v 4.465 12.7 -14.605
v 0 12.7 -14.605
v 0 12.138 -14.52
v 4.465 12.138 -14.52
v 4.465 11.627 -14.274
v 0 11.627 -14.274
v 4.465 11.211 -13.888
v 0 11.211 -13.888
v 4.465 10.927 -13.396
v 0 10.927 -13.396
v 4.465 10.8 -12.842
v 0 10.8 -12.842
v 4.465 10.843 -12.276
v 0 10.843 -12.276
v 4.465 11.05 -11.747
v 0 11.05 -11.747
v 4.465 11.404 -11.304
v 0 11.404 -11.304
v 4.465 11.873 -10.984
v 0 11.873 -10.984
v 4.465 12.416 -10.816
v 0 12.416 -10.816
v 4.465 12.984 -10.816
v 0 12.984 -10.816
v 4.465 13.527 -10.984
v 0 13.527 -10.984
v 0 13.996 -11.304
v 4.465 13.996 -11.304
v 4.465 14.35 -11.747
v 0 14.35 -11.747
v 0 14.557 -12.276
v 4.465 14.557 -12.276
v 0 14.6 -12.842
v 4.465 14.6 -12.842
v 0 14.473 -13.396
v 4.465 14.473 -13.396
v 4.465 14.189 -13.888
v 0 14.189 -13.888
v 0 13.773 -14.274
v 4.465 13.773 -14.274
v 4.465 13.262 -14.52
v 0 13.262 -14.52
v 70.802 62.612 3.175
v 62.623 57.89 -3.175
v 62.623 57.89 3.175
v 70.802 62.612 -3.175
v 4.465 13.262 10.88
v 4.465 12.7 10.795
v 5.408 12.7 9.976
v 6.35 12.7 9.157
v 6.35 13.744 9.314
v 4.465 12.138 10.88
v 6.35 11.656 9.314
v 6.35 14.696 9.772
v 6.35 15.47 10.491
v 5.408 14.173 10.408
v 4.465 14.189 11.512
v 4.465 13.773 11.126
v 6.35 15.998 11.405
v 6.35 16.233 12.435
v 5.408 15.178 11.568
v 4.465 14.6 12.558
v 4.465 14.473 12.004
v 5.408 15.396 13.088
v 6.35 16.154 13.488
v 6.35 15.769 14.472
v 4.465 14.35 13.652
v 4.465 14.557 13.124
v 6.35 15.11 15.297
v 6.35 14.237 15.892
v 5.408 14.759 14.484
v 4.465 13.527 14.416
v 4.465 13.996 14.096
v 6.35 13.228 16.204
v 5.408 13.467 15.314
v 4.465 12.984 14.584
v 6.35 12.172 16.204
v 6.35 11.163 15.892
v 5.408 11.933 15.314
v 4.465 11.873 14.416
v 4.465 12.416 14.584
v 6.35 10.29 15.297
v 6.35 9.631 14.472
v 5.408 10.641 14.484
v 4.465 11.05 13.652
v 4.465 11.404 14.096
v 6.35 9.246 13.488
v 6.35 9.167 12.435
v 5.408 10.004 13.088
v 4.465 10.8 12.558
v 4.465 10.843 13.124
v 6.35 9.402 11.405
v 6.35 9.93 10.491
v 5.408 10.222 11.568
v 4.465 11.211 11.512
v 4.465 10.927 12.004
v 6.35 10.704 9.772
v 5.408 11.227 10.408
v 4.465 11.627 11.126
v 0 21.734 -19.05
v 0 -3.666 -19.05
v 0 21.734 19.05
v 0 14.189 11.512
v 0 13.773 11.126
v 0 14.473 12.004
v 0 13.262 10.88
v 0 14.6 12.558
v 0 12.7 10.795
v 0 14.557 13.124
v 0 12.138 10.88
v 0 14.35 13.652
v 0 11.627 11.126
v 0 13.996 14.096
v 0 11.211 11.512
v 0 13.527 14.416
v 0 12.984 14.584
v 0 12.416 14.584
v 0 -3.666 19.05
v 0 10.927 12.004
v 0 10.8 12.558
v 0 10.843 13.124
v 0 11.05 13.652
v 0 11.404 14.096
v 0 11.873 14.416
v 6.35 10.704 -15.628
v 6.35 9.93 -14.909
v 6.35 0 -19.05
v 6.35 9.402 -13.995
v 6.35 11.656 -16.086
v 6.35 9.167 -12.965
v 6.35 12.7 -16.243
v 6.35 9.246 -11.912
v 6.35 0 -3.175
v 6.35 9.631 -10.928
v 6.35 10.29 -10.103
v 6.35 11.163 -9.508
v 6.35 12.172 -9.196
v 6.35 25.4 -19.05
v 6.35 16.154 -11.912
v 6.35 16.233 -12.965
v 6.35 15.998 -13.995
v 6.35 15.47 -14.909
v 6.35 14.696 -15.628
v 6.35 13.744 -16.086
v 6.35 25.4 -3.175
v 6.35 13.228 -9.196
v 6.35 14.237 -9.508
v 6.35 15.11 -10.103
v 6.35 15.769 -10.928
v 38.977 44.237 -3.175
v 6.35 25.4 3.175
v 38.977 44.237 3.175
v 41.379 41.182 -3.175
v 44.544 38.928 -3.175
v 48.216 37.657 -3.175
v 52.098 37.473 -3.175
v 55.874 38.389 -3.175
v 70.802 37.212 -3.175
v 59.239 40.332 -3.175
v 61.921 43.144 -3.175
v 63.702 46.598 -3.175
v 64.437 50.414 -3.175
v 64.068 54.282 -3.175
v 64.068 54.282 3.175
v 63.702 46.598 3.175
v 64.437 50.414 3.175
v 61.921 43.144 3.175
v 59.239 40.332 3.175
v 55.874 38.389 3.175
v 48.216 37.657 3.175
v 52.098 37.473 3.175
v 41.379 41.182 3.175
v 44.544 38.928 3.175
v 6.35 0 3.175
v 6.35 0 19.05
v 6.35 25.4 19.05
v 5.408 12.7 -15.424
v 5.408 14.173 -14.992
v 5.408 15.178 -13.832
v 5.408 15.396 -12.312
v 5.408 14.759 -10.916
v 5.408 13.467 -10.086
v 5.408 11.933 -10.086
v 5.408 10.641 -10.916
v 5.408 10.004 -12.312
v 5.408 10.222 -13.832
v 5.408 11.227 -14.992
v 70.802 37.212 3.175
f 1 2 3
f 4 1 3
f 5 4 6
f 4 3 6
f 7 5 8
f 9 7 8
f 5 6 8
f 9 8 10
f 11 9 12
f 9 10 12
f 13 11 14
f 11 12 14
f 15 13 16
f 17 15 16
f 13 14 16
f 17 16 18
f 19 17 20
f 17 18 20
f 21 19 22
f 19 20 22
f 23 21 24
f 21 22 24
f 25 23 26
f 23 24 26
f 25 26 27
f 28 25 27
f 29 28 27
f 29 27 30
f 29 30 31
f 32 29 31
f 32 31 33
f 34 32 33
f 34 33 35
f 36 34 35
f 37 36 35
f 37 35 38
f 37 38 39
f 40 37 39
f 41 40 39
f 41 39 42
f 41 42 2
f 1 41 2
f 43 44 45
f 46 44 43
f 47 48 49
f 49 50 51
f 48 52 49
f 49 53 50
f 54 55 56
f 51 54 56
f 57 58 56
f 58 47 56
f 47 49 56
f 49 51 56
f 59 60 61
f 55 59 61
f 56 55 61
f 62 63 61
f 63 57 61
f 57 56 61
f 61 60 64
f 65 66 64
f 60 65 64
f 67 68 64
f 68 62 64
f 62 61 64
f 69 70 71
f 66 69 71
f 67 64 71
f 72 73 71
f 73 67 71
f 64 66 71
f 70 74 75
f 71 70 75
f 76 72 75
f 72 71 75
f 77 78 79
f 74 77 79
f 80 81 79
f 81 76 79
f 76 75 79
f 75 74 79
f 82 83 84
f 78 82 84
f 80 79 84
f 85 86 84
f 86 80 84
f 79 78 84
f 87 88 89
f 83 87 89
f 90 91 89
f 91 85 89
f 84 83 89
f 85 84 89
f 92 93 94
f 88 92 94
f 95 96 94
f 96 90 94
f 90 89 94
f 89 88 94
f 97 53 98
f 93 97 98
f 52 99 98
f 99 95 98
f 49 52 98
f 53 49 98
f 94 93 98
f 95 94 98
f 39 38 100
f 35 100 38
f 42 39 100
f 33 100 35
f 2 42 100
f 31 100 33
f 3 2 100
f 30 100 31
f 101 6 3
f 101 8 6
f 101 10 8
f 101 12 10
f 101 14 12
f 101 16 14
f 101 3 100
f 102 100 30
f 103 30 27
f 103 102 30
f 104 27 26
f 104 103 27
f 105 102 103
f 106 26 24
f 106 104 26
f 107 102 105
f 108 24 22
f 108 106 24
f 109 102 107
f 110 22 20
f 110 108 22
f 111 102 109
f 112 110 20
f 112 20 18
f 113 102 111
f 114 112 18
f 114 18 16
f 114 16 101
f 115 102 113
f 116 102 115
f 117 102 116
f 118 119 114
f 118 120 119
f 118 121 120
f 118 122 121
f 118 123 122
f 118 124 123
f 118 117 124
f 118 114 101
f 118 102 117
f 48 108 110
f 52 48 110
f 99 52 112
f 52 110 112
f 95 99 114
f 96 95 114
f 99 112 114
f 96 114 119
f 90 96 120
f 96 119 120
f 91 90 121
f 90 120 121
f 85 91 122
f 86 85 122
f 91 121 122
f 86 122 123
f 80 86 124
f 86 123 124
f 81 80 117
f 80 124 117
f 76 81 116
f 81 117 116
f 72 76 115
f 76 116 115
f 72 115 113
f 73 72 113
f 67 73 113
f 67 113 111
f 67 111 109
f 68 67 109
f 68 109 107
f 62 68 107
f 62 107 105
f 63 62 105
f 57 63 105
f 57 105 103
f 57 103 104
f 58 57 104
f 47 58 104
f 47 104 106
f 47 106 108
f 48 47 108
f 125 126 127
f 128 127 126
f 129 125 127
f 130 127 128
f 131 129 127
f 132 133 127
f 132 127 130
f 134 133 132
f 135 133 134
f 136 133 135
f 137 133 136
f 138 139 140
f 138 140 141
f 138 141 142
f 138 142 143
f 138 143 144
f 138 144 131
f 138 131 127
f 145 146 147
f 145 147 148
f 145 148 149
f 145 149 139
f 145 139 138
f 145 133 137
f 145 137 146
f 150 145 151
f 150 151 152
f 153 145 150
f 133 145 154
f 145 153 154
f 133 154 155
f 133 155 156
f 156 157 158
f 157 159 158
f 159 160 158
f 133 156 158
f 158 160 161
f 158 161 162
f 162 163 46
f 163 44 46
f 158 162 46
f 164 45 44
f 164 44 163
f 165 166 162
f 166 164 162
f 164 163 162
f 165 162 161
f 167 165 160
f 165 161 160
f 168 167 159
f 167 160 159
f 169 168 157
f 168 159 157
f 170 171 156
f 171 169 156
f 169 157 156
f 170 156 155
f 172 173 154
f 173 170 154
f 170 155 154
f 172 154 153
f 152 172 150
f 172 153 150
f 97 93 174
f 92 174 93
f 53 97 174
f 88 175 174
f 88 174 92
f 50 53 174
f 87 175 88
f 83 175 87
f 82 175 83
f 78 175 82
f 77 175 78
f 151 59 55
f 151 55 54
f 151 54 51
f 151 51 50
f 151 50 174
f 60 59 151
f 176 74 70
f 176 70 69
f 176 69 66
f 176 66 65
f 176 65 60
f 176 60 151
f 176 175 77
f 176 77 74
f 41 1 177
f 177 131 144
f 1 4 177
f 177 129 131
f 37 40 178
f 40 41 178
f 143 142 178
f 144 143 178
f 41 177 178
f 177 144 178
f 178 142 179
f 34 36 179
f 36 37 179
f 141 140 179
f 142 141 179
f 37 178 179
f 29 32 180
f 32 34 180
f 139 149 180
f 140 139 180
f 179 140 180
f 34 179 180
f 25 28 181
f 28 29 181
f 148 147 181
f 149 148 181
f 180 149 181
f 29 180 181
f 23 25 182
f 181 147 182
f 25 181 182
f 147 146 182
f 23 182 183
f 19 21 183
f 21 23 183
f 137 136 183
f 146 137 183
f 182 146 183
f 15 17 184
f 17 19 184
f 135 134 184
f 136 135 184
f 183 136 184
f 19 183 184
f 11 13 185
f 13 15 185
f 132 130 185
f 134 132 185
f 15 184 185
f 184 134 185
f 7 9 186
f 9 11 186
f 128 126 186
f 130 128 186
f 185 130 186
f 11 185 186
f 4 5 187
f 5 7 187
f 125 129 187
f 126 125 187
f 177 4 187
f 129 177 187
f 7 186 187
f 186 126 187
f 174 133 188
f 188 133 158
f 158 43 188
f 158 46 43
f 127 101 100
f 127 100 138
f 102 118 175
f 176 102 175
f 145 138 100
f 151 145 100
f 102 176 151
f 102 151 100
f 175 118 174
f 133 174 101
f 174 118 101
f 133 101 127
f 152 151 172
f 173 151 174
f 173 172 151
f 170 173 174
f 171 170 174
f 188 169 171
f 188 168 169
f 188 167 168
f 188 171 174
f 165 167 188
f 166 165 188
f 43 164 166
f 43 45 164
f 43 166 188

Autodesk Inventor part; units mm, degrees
ref_plane "YZ Plane" through (0, 0, 0) normal (1, 0, 0) x (0, 1, 0)
ref_plane "XZ Plane" through (0, 0, 0) normal (0, 1, 0) x (-1, 0, 0)
ref_plane "XY Plane" through (0, 0, 0) normal (0, 0, 1) x (1, 0, 0)
sketch "Sketch5" plane through (0, 0, 0) normal (0, 0, 1) x (1, 0, 0)
  line L0 (0, 0) -> (6.35, 0)
  line L1 (6.35, 0) -> (6.35, 25.4)
  line L2 (6.35, 25.4) -> (0, 25.4)
  line L3 (0, 25.4) -> (0, 0)
  dimension "d21" = 25.4
  dimension "d22" = 6.35
extrude "Extrusion3" add sketch "Sketch5" against normal mid plane 38.1
sketch "Sketch6" plane through (0, 0, 0) normal (0, 0, 1) x (1, 0, 0)
  line L0 (6.35, 25.4) -> (6.35, 0) projected
  line L1 (0, 25.4) -> (6.35, 25.4) projected
  line L2 (6.35, 0) -> (0, 0) projected
  line L3 (0, 0) -> (0, 25.4) projected
  line L4 (6.35, 0) -> (70.8025, 37.2117)
  line L5 (6.35, 0) -> (80.7733, 0) construction
  line L6 (70.8025, 62.6117) -> (70.8025, 37.2117)
  arc A0 (38.9766, 44.237) -> (62.6234, 57.8895) centre (50.8, 51.0632) ccw
  line L7 (6.35, 25.4) -> (38.9766, 44.237)
  line L8 (62.6234, 57.8895) -> (70.8025, 62.6117)
  dimension "d25" = 30
  dimension "d26" = 27.305
  dimension "d29" = 6.35
  dimension "d30" = 50.8
  dimension "d33" = 0
extrude "Extrusion4" add sketch "Sketch6" along normal mid plane 6.35 contours L7 A0 L8 L6 L4 L0
sketch "Sketch7" plane through (6.35, 0, 19.05) normal (1, 0, 0) x (0, 0, -1)
  line L0 (38.1, 25.4) -> (0, 25.4) construction
  line L1 (6.35, 25.4) -> (6.35, 0) construction
  line L2 (31.75, 25.4) -> (31.75, 0) construction
  line L3 (0, 0) -> (0, 25.4) construction
  line L4 (38.1, 25.4) -> (38.1, 0) construction
  line L5 (0, 0) -> (15.875, 0) projected
  line L6 (22.225, 0) -> (38.1, 0) projected
  point P0 (19.05, 0)
  point P1 (6.35, 12.7)
  point P2 (31.75, 12.7)
  dimension "d34" = 6.35
  dimension "d35" = 6.35
sketch "Sketch8" plane through (0, 0, 0) normal (0, 0, 1) x (1, 0, 0)
  line L0 (0, 0) -> (0, 25.4) projected
  line L1 (6.35, 0) -> (0, 0) projected
  line L2 (70.8025, 37.2117) -> (6.35, 0) projected
  line L3 (0, 0) -> (6.35, 0)
  line L4 (0, -3.6662) -> (6.35, 0)
  line L5 (0, 0) -> (0, -3.6662)
extrude "Extrusion5" add sketch "Sketch8" along normal mid plane 38.1
hole "Hole3" at (6.35, 12.7, 12.7) at (6.35, 12.7, -12.7) direction (-1, 0, 0) diameter 3.81 end through all countersink diameter 7.0866 countersink angle 82 clearance for "Flat Head Machine Screw (82)" size "#6" standard "Ansi Unified Screw Threads"
sketch "Sketch9" plane through (0, 0, 0) normal (0, 0, 1) x (1, 0, 0)
  line L0 (0, -3.6662) -> (0, 25.4) projected
  line L1 (0, 25.4) -> (6.35, 25.4) projected
  line L2 (6.35, 25.4) -> (6.35, 0) projected
  line L3 (6.35, 25.4) -> (38.9766, 44.237) projected
  line L4 (6.35, 25.4) -> (0, 25.4)
  line L5 (6.35, 25.4) -> (0, 21.7338)
  line L6 (0, 25.4) -> (0, 21.7338)
  point P0 (0, 0)
extrude "Extrusion6" cut sketch "Sketch9" against normal mid plane 38.1
equation "\"d21\" = supportHeight"
equation "\"d22\" = supportWidth"
equation "\"d23\" = totalScrewHoldWidth"
equation "\"d25\" = supportAngle"
equation "\"d26\" = pipeDiameter"
equation "\"d30\" = distanceFromWallToPipeCenter"
equation "\"d31\" = supportWidth"
equation "\"d47\" = totalScrewHoldWidth"
equation "\"d63\" = totalScrewHoldWidth"
equation "\"pipeDiameter\" = 27.305"
equation "\"distanceFromWallToPipeCenter\" = 50.8"
equation "\"supportHeight\" = 25.4"
equation "\"supportWidth\" = 6.35"
equation "\"screwHoldDepth\" = 6.35"
equation "\"totalScrewHoldWidth\" = 38.1"
equation "\"screwPositionFromTop\" = 6.35"
equation "\"supportAngle\" = 30deg"
properties part number "PipeSupport-2_00-030"
